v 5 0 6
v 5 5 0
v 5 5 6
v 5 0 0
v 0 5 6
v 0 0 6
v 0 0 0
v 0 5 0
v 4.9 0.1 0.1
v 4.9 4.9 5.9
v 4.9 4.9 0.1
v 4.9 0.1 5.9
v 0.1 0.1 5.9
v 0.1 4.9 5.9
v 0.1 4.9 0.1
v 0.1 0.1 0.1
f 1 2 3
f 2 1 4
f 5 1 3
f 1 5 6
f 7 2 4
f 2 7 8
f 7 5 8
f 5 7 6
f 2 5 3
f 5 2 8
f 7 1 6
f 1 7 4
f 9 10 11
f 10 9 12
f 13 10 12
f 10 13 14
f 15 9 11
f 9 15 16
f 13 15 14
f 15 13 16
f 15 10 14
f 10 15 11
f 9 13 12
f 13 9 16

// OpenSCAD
difference(){
	cube([5,5,6]);
	translate([0.1,0.1,0.1]){
		cube([4.8,4.8,5.8]);
	}
}
